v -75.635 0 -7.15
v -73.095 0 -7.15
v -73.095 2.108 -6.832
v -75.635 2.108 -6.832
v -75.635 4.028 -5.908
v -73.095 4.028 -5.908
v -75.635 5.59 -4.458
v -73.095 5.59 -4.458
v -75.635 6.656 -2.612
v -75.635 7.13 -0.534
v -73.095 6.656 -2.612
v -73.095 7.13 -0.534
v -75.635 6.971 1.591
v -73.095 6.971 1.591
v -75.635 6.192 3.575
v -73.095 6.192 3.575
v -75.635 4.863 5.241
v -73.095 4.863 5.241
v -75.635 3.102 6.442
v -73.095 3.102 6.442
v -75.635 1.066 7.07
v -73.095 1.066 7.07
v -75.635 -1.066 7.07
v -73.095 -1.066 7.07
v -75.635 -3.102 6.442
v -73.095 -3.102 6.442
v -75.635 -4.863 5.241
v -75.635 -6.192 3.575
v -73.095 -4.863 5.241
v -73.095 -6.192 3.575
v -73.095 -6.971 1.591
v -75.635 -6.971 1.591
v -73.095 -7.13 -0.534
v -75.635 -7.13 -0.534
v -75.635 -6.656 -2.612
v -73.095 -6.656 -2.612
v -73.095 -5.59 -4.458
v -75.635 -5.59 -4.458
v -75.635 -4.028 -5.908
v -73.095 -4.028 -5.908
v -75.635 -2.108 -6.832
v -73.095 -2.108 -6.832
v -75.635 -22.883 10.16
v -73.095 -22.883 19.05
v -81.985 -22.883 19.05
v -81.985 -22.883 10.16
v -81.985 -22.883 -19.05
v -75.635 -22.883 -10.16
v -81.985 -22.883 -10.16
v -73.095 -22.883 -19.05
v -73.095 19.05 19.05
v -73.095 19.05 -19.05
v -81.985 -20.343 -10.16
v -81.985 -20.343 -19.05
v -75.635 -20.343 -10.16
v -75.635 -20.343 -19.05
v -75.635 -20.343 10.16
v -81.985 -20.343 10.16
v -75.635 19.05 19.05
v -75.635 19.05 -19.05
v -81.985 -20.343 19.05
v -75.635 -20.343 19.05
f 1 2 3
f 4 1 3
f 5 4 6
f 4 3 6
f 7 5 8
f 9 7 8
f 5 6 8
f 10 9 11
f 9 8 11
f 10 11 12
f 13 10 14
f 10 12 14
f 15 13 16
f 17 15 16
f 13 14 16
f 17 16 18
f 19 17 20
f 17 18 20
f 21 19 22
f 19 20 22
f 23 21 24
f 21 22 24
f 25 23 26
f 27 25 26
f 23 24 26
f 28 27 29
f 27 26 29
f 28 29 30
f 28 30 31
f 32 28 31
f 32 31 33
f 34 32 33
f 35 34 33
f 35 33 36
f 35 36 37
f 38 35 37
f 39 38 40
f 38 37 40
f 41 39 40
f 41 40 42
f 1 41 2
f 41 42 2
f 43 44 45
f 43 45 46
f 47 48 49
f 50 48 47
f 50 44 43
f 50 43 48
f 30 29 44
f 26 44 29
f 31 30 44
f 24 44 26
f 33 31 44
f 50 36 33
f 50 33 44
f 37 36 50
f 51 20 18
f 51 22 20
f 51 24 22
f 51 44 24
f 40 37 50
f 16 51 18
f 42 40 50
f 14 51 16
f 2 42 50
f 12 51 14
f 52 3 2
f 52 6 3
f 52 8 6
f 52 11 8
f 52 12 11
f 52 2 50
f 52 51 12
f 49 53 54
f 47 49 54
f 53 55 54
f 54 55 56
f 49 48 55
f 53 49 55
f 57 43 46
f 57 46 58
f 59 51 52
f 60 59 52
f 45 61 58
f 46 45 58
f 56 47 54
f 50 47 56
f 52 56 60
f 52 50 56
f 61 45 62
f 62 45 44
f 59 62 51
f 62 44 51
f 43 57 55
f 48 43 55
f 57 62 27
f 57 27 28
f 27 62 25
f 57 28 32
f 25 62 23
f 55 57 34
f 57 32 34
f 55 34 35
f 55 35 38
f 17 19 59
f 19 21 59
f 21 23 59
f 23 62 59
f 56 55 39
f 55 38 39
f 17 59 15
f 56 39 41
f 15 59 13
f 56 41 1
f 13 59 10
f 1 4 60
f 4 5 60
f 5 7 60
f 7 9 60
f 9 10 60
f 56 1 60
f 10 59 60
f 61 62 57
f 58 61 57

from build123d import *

# Parameters (mm, degrees)
SKETCH3_W           = 38.1
SKETCH3_H           = 41.932660102
SKETCH3_R           = 7.1501
BOSS_EXTRUDE1_DEPTH = 2.54
SKETCH4_W           = 8.89
SKETCH4_H           = 2.54
BOSS_EXTRUDE2_DEPTH = 8.89


with BuildPart() as part:
    # Sketch3 → Boss-Extrude1 (new body)
    with BuildSketch(Plane(origin=(-73.0954, 0, 0), x_dir=(0, 0, -1), z_dir=(1, 0, 0))):
        with Locations((0, -1.916330051)):
            Rectangle(SKETCH3_W, SKETCH3_H)
        Circle(SKETCH3_R, mode=Mode.SUBTRACT)
    extrude(amount=-BOSS_EXTRUDE1_DEPTH)

    # Sketch4 → Boss-Extrude2 (add)
    with BuildSketch(Plane(origin=(-73.0954, 0, 0), x_dir=(0, 0, -1), z_dir=(1, 0, 0))):
        with Locations((14.605, -21.612660102)):
            Rectangle(SKETCH4_W, SKETCH4_H)
        with Locations((-14.605, -21.612660102)):
            Rectangle(SKETCH4_W, SKETCH4_H)
    extrude(amount=-BOSS_EXTRUDE2_DEPTH)


solid = part.part
